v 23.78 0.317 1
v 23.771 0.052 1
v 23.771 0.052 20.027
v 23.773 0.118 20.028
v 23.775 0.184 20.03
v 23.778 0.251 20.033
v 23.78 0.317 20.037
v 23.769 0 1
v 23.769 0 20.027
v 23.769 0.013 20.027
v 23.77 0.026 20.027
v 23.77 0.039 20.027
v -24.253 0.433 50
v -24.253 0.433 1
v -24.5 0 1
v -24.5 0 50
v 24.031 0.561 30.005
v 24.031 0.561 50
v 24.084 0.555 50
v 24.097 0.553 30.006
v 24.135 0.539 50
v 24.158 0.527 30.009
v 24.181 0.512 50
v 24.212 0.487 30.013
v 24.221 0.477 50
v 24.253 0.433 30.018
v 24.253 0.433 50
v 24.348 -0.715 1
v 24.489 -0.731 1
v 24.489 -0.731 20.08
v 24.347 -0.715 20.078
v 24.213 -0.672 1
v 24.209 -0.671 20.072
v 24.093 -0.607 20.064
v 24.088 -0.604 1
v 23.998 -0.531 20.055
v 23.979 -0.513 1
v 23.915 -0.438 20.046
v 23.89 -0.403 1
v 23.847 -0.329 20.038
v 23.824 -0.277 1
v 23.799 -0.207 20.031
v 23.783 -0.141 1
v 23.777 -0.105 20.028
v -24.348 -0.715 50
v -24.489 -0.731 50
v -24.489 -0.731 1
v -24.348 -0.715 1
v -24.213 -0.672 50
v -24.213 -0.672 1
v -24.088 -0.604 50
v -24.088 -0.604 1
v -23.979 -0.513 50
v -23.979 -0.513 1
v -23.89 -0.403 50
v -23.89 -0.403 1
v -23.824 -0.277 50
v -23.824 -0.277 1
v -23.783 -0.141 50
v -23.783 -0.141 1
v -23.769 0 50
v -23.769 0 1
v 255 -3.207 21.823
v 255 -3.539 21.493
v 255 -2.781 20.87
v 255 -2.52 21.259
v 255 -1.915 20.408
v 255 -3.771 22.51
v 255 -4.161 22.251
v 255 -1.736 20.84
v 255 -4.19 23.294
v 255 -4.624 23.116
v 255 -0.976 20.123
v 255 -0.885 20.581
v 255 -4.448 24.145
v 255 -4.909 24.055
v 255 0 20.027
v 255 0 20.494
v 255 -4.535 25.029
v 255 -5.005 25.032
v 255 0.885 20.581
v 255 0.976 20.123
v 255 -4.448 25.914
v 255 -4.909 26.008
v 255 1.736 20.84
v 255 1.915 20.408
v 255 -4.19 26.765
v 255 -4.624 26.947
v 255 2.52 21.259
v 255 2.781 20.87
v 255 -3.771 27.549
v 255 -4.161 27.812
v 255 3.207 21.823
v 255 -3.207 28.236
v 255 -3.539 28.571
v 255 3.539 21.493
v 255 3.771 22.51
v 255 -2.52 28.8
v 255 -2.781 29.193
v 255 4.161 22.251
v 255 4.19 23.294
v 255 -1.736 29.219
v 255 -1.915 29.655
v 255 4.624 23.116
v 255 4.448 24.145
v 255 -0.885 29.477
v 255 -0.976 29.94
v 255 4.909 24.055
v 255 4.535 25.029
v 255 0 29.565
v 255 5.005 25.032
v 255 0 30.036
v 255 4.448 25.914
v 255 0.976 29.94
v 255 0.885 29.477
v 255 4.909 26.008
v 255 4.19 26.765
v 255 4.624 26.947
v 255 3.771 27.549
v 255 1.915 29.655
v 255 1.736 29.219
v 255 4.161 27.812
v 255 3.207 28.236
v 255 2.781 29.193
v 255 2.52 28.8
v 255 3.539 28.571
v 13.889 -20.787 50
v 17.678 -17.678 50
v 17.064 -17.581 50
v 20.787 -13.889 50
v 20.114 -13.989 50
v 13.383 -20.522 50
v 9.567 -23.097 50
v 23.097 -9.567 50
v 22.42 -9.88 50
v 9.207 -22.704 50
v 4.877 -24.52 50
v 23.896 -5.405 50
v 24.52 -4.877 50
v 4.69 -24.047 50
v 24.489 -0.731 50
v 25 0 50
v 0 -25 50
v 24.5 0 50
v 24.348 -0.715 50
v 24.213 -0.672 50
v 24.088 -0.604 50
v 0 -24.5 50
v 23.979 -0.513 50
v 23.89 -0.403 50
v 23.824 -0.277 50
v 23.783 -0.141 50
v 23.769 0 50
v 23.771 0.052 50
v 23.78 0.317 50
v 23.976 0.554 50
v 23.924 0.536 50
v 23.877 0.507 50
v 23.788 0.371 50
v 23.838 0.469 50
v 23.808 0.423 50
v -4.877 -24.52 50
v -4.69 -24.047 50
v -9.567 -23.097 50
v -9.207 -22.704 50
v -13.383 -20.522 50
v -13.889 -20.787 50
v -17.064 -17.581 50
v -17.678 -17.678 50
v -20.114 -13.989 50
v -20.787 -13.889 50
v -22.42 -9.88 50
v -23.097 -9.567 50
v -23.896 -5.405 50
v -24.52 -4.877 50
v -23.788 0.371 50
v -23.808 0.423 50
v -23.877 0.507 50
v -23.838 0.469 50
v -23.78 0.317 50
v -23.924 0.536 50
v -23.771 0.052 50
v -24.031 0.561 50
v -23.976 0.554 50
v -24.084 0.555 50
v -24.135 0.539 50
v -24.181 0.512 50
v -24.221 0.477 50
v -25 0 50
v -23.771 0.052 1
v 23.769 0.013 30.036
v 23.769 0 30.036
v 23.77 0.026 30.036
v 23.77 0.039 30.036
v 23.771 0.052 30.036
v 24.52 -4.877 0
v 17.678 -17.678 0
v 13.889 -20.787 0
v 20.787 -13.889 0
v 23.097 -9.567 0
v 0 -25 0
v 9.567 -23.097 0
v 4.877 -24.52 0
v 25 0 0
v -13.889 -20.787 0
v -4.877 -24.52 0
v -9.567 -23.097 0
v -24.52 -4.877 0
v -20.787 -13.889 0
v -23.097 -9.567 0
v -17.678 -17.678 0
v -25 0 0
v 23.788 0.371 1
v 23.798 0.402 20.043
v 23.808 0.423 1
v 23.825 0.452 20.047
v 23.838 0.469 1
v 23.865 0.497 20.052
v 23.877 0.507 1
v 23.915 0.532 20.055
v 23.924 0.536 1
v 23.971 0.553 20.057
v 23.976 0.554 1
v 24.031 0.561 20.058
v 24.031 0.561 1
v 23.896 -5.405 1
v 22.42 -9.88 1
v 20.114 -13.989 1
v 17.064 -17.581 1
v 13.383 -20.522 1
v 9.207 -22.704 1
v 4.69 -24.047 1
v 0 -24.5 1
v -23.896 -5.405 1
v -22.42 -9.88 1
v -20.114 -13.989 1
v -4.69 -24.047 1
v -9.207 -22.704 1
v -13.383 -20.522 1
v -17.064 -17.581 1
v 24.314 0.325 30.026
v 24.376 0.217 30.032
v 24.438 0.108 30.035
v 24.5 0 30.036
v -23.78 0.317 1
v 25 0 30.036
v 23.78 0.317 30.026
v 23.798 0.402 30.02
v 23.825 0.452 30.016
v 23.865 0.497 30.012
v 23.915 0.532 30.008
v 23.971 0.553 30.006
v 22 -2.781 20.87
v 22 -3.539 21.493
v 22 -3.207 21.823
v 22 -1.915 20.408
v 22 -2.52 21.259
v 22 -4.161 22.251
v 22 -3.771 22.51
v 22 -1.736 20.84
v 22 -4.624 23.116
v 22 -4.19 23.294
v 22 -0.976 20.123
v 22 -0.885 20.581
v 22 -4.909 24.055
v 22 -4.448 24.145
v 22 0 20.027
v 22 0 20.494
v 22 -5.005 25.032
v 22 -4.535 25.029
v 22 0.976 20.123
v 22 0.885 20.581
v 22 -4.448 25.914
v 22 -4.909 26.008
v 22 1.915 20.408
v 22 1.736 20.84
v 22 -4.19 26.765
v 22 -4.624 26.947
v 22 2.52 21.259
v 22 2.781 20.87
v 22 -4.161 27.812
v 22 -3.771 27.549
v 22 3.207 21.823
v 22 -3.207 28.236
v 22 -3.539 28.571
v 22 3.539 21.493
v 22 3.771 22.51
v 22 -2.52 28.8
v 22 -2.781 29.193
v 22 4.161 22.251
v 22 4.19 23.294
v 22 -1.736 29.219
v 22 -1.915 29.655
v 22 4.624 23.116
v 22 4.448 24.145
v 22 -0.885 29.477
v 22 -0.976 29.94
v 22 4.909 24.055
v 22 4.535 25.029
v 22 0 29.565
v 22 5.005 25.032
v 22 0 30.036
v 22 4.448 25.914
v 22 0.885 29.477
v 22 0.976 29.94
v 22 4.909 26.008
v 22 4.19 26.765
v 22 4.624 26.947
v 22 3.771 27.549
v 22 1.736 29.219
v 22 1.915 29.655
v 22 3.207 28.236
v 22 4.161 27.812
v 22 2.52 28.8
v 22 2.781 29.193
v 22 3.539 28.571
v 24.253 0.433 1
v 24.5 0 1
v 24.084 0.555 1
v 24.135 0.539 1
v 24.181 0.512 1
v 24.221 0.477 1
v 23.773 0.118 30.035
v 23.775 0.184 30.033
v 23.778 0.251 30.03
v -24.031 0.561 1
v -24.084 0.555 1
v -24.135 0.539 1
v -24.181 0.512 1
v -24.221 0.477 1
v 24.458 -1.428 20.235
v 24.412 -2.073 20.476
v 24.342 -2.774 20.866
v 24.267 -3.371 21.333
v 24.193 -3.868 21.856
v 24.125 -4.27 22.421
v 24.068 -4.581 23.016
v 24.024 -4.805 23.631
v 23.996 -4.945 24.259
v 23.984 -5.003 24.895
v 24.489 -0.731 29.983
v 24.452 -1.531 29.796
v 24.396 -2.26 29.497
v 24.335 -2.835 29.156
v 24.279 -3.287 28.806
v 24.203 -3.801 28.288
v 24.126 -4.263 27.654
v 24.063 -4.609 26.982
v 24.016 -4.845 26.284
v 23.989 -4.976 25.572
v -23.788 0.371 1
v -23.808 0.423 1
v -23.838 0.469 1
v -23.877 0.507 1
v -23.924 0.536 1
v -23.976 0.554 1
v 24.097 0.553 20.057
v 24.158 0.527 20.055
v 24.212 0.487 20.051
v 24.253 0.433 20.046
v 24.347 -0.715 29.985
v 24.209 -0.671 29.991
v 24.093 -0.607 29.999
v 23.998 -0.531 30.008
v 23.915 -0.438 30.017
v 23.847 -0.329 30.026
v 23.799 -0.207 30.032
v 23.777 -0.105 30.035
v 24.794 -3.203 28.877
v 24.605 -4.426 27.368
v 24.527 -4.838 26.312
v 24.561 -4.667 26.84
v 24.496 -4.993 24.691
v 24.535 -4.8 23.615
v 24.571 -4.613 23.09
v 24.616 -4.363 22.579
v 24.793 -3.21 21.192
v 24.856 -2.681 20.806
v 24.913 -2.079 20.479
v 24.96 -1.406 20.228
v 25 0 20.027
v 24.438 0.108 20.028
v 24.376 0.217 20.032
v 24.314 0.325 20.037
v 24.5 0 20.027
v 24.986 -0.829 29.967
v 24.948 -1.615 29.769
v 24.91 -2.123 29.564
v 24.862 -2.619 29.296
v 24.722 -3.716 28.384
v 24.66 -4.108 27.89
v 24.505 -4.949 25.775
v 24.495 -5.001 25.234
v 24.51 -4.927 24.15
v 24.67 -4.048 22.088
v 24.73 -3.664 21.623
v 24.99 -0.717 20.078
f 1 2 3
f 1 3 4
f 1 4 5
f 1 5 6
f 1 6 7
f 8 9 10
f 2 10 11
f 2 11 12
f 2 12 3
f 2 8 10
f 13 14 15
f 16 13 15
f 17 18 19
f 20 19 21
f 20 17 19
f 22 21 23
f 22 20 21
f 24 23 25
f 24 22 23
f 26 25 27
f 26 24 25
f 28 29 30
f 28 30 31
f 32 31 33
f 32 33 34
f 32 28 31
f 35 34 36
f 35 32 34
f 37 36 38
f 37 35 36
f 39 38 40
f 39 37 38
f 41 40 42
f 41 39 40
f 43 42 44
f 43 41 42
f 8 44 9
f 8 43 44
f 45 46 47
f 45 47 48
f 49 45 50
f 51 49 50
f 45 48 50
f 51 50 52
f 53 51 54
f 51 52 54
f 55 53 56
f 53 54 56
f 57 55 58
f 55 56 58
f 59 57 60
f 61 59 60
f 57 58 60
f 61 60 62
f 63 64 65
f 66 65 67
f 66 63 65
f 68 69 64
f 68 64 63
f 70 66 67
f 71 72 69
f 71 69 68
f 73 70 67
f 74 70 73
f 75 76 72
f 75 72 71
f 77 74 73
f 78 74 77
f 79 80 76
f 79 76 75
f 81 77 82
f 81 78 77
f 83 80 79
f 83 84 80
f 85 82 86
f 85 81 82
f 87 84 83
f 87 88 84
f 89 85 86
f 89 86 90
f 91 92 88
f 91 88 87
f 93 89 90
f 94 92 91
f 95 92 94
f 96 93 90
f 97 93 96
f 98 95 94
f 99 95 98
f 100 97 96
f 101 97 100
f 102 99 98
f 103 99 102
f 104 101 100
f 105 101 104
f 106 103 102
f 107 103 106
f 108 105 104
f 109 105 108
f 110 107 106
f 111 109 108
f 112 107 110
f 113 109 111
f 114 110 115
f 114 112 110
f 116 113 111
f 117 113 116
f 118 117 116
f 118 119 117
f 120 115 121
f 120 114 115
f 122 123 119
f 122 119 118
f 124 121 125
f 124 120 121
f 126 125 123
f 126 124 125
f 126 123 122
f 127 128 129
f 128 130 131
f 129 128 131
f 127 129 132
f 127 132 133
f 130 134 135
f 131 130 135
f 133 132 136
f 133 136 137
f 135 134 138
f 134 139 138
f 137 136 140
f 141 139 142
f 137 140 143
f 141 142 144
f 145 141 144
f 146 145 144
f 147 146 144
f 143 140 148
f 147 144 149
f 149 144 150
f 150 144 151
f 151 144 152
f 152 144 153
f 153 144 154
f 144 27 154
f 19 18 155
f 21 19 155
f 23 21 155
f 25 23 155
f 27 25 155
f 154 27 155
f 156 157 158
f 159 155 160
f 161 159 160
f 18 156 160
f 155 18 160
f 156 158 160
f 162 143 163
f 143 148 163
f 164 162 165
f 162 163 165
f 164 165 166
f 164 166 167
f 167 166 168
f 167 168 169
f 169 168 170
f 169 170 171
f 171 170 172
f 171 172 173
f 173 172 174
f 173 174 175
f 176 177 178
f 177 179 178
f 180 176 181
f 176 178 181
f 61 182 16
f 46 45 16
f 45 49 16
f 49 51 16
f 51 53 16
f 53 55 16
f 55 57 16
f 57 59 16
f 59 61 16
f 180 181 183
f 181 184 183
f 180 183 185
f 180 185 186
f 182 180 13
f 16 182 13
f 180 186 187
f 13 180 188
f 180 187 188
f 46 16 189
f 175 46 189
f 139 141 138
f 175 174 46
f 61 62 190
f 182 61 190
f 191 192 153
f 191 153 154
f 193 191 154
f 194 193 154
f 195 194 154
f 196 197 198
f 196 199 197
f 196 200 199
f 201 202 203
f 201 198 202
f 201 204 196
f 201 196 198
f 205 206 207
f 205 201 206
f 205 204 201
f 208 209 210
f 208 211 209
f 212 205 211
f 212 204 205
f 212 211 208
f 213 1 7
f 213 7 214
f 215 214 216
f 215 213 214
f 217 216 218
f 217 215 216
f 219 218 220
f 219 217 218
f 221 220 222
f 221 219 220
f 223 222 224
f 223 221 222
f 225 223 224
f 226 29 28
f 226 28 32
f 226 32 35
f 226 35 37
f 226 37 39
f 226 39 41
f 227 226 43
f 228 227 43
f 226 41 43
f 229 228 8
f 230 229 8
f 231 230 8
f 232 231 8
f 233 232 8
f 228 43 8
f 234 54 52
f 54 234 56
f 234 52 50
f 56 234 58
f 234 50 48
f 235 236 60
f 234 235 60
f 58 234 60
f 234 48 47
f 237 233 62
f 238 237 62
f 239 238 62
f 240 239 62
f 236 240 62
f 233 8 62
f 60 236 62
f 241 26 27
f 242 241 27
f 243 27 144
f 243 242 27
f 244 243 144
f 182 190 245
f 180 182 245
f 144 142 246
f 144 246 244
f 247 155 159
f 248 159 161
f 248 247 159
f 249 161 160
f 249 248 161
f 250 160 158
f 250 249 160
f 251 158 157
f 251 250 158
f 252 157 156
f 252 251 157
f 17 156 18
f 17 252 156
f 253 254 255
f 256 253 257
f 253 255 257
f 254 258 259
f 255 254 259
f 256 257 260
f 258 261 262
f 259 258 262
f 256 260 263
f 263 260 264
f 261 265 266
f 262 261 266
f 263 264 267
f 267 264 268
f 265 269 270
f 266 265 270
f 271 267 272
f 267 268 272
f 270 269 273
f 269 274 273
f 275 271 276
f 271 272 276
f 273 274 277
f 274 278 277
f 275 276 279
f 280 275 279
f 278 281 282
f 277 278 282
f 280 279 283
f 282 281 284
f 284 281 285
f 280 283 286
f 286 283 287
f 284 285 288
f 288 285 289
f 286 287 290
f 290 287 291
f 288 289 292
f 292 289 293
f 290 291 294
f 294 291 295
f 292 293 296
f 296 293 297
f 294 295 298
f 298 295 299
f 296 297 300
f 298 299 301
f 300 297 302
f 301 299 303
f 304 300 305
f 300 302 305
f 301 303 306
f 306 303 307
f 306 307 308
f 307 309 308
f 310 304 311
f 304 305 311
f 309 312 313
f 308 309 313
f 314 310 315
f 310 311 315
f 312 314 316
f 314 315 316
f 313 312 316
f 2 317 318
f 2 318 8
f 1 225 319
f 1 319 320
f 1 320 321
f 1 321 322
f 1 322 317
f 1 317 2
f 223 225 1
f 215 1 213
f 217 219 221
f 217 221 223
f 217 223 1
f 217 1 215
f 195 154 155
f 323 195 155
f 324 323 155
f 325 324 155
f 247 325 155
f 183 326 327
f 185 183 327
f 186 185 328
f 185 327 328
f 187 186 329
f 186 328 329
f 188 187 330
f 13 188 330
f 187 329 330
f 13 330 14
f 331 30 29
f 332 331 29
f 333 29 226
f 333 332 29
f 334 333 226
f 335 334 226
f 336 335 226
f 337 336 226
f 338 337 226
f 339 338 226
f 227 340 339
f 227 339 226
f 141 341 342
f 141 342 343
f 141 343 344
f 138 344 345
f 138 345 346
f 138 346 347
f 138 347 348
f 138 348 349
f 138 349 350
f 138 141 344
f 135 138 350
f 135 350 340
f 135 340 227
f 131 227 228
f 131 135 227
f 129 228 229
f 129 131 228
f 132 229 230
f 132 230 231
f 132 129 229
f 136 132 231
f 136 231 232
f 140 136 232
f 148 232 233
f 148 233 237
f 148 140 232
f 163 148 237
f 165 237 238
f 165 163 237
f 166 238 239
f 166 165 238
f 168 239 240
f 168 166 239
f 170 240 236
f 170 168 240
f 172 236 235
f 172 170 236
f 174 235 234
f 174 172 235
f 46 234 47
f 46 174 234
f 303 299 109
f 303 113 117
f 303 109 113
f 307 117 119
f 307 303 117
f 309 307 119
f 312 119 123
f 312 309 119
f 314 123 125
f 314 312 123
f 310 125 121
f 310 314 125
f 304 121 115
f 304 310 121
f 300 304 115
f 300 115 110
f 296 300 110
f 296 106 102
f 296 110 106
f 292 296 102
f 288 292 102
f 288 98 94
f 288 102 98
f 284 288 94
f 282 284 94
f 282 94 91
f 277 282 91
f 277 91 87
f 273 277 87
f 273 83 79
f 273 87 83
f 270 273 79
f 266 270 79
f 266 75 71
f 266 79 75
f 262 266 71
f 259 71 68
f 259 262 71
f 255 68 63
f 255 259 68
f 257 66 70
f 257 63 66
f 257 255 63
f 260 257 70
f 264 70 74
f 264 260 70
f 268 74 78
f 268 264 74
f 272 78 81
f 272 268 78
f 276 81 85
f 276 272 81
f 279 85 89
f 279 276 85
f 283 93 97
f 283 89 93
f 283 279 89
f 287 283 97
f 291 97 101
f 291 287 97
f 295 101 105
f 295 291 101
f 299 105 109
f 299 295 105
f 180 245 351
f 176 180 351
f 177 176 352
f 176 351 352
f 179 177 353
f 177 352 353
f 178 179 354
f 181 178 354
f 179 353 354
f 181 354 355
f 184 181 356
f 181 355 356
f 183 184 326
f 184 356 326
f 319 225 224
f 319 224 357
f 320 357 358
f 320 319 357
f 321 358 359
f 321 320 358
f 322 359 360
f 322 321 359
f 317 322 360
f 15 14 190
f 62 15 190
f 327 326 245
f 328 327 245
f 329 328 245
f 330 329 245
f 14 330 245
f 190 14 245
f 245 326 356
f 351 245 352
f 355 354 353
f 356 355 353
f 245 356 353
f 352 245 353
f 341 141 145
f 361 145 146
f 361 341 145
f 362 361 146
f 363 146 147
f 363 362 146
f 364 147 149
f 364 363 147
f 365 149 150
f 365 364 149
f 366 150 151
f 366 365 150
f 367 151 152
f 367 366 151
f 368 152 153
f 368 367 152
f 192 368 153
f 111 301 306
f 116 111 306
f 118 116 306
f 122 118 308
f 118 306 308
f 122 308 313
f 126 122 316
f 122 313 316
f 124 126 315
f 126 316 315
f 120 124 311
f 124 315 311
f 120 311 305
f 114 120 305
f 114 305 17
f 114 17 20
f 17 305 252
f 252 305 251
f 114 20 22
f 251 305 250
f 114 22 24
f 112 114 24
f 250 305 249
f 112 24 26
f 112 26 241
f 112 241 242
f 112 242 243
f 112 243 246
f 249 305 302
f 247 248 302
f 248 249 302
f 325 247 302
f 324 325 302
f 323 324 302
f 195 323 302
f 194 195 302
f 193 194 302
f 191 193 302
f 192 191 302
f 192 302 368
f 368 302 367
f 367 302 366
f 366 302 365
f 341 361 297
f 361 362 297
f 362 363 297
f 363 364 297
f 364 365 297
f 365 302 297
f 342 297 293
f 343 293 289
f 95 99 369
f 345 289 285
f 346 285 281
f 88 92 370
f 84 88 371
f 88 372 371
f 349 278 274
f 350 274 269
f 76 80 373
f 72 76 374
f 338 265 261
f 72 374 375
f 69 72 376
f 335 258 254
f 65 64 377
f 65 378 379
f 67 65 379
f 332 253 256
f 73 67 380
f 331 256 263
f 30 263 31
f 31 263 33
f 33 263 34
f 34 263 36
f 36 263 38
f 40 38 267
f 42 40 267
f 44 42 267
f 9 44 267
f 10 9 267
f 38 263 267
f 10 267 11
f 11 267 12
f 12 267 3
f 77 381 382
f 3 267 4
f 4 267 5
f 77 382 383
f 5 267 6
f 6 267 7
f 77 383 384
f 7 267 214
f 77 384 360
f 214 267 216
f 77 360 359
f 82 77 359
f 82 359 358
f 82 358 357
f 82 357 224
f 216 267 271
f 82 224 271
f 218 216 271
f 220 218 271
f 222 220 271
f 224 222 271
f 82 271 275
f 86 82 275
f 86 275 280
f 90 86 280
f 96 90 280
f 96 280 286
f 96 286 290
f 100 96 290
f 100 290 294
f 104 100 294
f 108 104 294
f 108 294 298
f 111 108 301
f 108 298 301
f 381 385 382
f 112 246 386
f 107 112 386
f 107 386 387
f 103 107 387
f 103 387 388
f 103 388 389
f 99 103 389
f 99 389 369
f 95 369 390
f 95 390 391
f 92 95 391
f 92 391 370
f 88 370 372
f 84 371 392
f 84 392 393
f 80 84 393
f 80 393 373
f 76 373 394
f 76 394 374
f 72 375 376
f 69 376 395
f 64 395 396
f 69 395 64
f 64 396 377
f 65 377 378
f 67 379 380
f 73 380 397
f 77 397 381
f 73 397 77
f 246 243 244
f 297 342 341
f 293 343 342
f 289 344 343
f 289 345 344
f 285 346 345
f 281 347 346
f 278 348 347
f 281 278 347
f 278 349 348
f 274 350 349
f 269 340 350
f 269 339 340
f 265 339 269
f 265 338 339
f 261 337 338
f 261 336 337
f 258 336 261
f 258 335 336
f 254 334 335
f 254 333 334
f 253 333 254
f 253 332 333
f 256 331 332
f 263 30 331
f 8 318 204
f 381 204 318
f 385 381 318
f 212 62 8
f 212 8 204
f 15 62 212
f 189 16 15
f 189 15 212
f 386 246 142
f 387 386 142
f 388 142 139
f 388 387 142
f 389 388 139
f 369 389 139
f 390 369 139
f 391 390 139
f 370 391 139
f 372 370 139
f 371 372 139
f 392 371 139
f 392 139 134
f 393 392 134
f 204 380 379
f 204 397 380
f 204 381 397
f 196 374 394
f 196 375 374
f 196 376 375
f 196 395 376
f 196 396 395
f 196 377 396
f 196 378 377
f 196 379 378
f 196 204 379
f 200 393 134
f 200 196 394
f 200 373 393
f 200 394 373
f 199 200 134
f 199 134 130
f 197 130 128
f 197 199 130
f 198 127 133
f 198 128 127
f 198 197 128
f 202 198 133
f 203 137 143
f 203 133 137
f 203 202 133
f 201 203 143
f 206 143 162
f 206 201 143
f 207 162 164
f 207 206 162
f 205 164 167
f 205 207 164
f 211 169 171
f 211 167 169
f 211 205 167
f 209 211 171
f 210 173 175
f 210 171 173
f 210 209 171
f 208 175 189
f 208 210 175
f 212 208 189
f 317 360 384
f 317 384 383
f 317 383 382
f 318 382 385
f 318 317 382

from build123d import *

# Parameters (mm, degrees)
F0_R      = 25
F1_DEPTH  = 50
F2_R      = 24.5
F3_DEPTH  = 49
F4_W      = 133.0040432513
F4_H      = 80.2016193047
F5_DEPTH  = 25
F7_DEPTH  = 49
F8_W      = 90.9072607756
F8_H      = 76.9354877993
F9_DEPTH  = 25
F11_R     = 5.0048176475
F11_R_2   = 4.4964097491
F12_DEPTH = 255
F13_DEPTH = 22
F14_R     = 4.5351415883
F15_DEPTH = 500


with BuildPart() as f1:
    # F0 (on Top) → F1 (new body)
    with BuildSketch(Plane.XY):
        Circle(F0_R)
    extrude(amount=F1_DEPTH)

    # F2 (on face) → F3 (cut)
    with BuildSketch(Plane.XY.offset(50)):
        Circle(F2_R)
    extrude(amount=-F3_DEPTH, mode=Mode.SUBTRACT)

    # F4 (on Front) → F5 (cut)
    with BuildSketch(Plane.XZ):
        with Locations((-6.1693545431, 24.7681471519)):
            Rectangle(F4_W, F4_H)
    extrude(amount=-F5_DEPTH, mode=Mode.SUBTRACT)

    # F6 (on face) → F7 (join)
    with BuildSketch(Plane.XY.offset(1)):
        with BuildLine():
            ThreePointArc((-23.7997439297, 0.2099188306), (-23.7849922899, 0.2579040005), (-23.7800096296, 0.307857584))
            ThreePointArc((-23.7800096296, 0.307857584), (-23.7800491855, 0.3123303341), (-23.780167841, 0.3168016851))
            ThreePointArc((-23.780167841, 0.3168016851), (-23.8565770485, 0.4891434991), (-24.0309707308, 0.5607459532))
            ThreePointArc((-24.0309707308, 0.5607459532), (-23.8896091672, 0.4023027599), (-23.7997439297, 0.2099188306))
        make_face()
        with BuildLine():
            ThreePointArc((-23.780167841, 0.3168016851), (-23.7800491855, 0.3123303341), (-23.7800096296, 0.307857584))
            ThreePointArc((-23.7800096296, 0.307857584), (-23.7849922899, 0.2579040005), (-23.7997439297, 0.2099188306))
            ThreePointArc((-23.7997439297, 0.2099188306), (-23.780898653, 0.1315968548), (-23.77078537, 0.0516769082))
            Line((-23.77078537, 0.0516769082), (-23.780167841, 0.3168016851))
        make_face()
        with BuildLine():
            ThreePointArc((-23.77078537, 0.0516769082), (-23.780898653, 0.1315968548), (-23.7997439297, 0.2099188306))
            ThreePointArc((-23.7997439297, 0.2099188306), (-24.1447977278, 0.0810616911), (-24.2525015897, 0.4332919626))
            Line((-24.2525015897, 0.4332919626), (-24.5, 0))
            Line((-24.5, 0), (-23.7689565817, 0))
            Line((-23.7689565817, 0), (-23.77078537, 0.0516769082))
        make_face()
        with BuildLine():
            ThreePointArc((-24.2525015897, 0.4332919626), (-24.1447977278, 0.0810616911), (-23.7997439297, 0.2099188306))
            ThreePointArc((-23.7997439297, 0.2099188306), (-23.8896091672, 0.4023027599), (-24.0309707308, 0.5607459532))
            ThreePointArc((-24.0309707308, 0.5607459532), (-24.1590214746, 0.5270629802), (-24.2525015897, 0.4332919626))
        make_face()
        with BuildLine():
            ThreePointArc((-24.5, 0), (-24.4972731927, -0.3655217092), (-24.489093378, -0.7309620544))
            ThreePointArc((-24.489093378, -0.7309620544), (-23.9792324445, -0.5130551945), (-23.7689565817, 0))
            Line((-23.7689565817, 0), (-24.5, 0))
        make_face()
    extrude(amount=F7_DEPTH)

    # F8 (on Right) → F9 (cut)
    with BuildSketch(Plane.YZ):
        with Locations((-10.7056461275, 28.0342758633)):
            Rectangle(F8_W, F8_H)
    extrude(amount=F9_DEPTH, mode=Mode.SUBTRACT)

    # F10: F1 across face


with BuildPart() as f1_1:
    add(f1.part)
    add(f1.part.mirror(Plane(origin=(0, -18.5631313131, 12.8737373737), x_dir=(0, 1, 0), z_dir=(1, 0, 0))))

    # F11 (on Right) → F12 (join)
    with BuildSketch(Plane.YZ):
        with Locations((0, 25.0316294775)):
            Circle(F11_R)
        with Locations((0, 25.0316294775)):
            Circle(F11_R_2, mode=Mode.SUBTRACT)
    extrude(amount=F12_DEPTH)

    # F11 (on Right) → F13 (cut)
    with BuildSketch(Plane.YZ):
        with Locations((0, 25.0316294775)):
            Circle(F11_R)
        with Locations((0, 25.0316294775)):
            Circle(F11_R_2, mode=Mode.SUBTRACT)
    extrude(amount=F13_DEPTH, mode=Mode.SUBTRACT)

    # F14 (on Right) → F15 (cut)
    with BuildSketch(Plane.YZ):
        with Locations((0, 25.0294525176)):
            Circle(F14_R)
    extrude(amount=F15_DEPTH, mode=Mode.SUBTRACT)


solid = f1_1.part
